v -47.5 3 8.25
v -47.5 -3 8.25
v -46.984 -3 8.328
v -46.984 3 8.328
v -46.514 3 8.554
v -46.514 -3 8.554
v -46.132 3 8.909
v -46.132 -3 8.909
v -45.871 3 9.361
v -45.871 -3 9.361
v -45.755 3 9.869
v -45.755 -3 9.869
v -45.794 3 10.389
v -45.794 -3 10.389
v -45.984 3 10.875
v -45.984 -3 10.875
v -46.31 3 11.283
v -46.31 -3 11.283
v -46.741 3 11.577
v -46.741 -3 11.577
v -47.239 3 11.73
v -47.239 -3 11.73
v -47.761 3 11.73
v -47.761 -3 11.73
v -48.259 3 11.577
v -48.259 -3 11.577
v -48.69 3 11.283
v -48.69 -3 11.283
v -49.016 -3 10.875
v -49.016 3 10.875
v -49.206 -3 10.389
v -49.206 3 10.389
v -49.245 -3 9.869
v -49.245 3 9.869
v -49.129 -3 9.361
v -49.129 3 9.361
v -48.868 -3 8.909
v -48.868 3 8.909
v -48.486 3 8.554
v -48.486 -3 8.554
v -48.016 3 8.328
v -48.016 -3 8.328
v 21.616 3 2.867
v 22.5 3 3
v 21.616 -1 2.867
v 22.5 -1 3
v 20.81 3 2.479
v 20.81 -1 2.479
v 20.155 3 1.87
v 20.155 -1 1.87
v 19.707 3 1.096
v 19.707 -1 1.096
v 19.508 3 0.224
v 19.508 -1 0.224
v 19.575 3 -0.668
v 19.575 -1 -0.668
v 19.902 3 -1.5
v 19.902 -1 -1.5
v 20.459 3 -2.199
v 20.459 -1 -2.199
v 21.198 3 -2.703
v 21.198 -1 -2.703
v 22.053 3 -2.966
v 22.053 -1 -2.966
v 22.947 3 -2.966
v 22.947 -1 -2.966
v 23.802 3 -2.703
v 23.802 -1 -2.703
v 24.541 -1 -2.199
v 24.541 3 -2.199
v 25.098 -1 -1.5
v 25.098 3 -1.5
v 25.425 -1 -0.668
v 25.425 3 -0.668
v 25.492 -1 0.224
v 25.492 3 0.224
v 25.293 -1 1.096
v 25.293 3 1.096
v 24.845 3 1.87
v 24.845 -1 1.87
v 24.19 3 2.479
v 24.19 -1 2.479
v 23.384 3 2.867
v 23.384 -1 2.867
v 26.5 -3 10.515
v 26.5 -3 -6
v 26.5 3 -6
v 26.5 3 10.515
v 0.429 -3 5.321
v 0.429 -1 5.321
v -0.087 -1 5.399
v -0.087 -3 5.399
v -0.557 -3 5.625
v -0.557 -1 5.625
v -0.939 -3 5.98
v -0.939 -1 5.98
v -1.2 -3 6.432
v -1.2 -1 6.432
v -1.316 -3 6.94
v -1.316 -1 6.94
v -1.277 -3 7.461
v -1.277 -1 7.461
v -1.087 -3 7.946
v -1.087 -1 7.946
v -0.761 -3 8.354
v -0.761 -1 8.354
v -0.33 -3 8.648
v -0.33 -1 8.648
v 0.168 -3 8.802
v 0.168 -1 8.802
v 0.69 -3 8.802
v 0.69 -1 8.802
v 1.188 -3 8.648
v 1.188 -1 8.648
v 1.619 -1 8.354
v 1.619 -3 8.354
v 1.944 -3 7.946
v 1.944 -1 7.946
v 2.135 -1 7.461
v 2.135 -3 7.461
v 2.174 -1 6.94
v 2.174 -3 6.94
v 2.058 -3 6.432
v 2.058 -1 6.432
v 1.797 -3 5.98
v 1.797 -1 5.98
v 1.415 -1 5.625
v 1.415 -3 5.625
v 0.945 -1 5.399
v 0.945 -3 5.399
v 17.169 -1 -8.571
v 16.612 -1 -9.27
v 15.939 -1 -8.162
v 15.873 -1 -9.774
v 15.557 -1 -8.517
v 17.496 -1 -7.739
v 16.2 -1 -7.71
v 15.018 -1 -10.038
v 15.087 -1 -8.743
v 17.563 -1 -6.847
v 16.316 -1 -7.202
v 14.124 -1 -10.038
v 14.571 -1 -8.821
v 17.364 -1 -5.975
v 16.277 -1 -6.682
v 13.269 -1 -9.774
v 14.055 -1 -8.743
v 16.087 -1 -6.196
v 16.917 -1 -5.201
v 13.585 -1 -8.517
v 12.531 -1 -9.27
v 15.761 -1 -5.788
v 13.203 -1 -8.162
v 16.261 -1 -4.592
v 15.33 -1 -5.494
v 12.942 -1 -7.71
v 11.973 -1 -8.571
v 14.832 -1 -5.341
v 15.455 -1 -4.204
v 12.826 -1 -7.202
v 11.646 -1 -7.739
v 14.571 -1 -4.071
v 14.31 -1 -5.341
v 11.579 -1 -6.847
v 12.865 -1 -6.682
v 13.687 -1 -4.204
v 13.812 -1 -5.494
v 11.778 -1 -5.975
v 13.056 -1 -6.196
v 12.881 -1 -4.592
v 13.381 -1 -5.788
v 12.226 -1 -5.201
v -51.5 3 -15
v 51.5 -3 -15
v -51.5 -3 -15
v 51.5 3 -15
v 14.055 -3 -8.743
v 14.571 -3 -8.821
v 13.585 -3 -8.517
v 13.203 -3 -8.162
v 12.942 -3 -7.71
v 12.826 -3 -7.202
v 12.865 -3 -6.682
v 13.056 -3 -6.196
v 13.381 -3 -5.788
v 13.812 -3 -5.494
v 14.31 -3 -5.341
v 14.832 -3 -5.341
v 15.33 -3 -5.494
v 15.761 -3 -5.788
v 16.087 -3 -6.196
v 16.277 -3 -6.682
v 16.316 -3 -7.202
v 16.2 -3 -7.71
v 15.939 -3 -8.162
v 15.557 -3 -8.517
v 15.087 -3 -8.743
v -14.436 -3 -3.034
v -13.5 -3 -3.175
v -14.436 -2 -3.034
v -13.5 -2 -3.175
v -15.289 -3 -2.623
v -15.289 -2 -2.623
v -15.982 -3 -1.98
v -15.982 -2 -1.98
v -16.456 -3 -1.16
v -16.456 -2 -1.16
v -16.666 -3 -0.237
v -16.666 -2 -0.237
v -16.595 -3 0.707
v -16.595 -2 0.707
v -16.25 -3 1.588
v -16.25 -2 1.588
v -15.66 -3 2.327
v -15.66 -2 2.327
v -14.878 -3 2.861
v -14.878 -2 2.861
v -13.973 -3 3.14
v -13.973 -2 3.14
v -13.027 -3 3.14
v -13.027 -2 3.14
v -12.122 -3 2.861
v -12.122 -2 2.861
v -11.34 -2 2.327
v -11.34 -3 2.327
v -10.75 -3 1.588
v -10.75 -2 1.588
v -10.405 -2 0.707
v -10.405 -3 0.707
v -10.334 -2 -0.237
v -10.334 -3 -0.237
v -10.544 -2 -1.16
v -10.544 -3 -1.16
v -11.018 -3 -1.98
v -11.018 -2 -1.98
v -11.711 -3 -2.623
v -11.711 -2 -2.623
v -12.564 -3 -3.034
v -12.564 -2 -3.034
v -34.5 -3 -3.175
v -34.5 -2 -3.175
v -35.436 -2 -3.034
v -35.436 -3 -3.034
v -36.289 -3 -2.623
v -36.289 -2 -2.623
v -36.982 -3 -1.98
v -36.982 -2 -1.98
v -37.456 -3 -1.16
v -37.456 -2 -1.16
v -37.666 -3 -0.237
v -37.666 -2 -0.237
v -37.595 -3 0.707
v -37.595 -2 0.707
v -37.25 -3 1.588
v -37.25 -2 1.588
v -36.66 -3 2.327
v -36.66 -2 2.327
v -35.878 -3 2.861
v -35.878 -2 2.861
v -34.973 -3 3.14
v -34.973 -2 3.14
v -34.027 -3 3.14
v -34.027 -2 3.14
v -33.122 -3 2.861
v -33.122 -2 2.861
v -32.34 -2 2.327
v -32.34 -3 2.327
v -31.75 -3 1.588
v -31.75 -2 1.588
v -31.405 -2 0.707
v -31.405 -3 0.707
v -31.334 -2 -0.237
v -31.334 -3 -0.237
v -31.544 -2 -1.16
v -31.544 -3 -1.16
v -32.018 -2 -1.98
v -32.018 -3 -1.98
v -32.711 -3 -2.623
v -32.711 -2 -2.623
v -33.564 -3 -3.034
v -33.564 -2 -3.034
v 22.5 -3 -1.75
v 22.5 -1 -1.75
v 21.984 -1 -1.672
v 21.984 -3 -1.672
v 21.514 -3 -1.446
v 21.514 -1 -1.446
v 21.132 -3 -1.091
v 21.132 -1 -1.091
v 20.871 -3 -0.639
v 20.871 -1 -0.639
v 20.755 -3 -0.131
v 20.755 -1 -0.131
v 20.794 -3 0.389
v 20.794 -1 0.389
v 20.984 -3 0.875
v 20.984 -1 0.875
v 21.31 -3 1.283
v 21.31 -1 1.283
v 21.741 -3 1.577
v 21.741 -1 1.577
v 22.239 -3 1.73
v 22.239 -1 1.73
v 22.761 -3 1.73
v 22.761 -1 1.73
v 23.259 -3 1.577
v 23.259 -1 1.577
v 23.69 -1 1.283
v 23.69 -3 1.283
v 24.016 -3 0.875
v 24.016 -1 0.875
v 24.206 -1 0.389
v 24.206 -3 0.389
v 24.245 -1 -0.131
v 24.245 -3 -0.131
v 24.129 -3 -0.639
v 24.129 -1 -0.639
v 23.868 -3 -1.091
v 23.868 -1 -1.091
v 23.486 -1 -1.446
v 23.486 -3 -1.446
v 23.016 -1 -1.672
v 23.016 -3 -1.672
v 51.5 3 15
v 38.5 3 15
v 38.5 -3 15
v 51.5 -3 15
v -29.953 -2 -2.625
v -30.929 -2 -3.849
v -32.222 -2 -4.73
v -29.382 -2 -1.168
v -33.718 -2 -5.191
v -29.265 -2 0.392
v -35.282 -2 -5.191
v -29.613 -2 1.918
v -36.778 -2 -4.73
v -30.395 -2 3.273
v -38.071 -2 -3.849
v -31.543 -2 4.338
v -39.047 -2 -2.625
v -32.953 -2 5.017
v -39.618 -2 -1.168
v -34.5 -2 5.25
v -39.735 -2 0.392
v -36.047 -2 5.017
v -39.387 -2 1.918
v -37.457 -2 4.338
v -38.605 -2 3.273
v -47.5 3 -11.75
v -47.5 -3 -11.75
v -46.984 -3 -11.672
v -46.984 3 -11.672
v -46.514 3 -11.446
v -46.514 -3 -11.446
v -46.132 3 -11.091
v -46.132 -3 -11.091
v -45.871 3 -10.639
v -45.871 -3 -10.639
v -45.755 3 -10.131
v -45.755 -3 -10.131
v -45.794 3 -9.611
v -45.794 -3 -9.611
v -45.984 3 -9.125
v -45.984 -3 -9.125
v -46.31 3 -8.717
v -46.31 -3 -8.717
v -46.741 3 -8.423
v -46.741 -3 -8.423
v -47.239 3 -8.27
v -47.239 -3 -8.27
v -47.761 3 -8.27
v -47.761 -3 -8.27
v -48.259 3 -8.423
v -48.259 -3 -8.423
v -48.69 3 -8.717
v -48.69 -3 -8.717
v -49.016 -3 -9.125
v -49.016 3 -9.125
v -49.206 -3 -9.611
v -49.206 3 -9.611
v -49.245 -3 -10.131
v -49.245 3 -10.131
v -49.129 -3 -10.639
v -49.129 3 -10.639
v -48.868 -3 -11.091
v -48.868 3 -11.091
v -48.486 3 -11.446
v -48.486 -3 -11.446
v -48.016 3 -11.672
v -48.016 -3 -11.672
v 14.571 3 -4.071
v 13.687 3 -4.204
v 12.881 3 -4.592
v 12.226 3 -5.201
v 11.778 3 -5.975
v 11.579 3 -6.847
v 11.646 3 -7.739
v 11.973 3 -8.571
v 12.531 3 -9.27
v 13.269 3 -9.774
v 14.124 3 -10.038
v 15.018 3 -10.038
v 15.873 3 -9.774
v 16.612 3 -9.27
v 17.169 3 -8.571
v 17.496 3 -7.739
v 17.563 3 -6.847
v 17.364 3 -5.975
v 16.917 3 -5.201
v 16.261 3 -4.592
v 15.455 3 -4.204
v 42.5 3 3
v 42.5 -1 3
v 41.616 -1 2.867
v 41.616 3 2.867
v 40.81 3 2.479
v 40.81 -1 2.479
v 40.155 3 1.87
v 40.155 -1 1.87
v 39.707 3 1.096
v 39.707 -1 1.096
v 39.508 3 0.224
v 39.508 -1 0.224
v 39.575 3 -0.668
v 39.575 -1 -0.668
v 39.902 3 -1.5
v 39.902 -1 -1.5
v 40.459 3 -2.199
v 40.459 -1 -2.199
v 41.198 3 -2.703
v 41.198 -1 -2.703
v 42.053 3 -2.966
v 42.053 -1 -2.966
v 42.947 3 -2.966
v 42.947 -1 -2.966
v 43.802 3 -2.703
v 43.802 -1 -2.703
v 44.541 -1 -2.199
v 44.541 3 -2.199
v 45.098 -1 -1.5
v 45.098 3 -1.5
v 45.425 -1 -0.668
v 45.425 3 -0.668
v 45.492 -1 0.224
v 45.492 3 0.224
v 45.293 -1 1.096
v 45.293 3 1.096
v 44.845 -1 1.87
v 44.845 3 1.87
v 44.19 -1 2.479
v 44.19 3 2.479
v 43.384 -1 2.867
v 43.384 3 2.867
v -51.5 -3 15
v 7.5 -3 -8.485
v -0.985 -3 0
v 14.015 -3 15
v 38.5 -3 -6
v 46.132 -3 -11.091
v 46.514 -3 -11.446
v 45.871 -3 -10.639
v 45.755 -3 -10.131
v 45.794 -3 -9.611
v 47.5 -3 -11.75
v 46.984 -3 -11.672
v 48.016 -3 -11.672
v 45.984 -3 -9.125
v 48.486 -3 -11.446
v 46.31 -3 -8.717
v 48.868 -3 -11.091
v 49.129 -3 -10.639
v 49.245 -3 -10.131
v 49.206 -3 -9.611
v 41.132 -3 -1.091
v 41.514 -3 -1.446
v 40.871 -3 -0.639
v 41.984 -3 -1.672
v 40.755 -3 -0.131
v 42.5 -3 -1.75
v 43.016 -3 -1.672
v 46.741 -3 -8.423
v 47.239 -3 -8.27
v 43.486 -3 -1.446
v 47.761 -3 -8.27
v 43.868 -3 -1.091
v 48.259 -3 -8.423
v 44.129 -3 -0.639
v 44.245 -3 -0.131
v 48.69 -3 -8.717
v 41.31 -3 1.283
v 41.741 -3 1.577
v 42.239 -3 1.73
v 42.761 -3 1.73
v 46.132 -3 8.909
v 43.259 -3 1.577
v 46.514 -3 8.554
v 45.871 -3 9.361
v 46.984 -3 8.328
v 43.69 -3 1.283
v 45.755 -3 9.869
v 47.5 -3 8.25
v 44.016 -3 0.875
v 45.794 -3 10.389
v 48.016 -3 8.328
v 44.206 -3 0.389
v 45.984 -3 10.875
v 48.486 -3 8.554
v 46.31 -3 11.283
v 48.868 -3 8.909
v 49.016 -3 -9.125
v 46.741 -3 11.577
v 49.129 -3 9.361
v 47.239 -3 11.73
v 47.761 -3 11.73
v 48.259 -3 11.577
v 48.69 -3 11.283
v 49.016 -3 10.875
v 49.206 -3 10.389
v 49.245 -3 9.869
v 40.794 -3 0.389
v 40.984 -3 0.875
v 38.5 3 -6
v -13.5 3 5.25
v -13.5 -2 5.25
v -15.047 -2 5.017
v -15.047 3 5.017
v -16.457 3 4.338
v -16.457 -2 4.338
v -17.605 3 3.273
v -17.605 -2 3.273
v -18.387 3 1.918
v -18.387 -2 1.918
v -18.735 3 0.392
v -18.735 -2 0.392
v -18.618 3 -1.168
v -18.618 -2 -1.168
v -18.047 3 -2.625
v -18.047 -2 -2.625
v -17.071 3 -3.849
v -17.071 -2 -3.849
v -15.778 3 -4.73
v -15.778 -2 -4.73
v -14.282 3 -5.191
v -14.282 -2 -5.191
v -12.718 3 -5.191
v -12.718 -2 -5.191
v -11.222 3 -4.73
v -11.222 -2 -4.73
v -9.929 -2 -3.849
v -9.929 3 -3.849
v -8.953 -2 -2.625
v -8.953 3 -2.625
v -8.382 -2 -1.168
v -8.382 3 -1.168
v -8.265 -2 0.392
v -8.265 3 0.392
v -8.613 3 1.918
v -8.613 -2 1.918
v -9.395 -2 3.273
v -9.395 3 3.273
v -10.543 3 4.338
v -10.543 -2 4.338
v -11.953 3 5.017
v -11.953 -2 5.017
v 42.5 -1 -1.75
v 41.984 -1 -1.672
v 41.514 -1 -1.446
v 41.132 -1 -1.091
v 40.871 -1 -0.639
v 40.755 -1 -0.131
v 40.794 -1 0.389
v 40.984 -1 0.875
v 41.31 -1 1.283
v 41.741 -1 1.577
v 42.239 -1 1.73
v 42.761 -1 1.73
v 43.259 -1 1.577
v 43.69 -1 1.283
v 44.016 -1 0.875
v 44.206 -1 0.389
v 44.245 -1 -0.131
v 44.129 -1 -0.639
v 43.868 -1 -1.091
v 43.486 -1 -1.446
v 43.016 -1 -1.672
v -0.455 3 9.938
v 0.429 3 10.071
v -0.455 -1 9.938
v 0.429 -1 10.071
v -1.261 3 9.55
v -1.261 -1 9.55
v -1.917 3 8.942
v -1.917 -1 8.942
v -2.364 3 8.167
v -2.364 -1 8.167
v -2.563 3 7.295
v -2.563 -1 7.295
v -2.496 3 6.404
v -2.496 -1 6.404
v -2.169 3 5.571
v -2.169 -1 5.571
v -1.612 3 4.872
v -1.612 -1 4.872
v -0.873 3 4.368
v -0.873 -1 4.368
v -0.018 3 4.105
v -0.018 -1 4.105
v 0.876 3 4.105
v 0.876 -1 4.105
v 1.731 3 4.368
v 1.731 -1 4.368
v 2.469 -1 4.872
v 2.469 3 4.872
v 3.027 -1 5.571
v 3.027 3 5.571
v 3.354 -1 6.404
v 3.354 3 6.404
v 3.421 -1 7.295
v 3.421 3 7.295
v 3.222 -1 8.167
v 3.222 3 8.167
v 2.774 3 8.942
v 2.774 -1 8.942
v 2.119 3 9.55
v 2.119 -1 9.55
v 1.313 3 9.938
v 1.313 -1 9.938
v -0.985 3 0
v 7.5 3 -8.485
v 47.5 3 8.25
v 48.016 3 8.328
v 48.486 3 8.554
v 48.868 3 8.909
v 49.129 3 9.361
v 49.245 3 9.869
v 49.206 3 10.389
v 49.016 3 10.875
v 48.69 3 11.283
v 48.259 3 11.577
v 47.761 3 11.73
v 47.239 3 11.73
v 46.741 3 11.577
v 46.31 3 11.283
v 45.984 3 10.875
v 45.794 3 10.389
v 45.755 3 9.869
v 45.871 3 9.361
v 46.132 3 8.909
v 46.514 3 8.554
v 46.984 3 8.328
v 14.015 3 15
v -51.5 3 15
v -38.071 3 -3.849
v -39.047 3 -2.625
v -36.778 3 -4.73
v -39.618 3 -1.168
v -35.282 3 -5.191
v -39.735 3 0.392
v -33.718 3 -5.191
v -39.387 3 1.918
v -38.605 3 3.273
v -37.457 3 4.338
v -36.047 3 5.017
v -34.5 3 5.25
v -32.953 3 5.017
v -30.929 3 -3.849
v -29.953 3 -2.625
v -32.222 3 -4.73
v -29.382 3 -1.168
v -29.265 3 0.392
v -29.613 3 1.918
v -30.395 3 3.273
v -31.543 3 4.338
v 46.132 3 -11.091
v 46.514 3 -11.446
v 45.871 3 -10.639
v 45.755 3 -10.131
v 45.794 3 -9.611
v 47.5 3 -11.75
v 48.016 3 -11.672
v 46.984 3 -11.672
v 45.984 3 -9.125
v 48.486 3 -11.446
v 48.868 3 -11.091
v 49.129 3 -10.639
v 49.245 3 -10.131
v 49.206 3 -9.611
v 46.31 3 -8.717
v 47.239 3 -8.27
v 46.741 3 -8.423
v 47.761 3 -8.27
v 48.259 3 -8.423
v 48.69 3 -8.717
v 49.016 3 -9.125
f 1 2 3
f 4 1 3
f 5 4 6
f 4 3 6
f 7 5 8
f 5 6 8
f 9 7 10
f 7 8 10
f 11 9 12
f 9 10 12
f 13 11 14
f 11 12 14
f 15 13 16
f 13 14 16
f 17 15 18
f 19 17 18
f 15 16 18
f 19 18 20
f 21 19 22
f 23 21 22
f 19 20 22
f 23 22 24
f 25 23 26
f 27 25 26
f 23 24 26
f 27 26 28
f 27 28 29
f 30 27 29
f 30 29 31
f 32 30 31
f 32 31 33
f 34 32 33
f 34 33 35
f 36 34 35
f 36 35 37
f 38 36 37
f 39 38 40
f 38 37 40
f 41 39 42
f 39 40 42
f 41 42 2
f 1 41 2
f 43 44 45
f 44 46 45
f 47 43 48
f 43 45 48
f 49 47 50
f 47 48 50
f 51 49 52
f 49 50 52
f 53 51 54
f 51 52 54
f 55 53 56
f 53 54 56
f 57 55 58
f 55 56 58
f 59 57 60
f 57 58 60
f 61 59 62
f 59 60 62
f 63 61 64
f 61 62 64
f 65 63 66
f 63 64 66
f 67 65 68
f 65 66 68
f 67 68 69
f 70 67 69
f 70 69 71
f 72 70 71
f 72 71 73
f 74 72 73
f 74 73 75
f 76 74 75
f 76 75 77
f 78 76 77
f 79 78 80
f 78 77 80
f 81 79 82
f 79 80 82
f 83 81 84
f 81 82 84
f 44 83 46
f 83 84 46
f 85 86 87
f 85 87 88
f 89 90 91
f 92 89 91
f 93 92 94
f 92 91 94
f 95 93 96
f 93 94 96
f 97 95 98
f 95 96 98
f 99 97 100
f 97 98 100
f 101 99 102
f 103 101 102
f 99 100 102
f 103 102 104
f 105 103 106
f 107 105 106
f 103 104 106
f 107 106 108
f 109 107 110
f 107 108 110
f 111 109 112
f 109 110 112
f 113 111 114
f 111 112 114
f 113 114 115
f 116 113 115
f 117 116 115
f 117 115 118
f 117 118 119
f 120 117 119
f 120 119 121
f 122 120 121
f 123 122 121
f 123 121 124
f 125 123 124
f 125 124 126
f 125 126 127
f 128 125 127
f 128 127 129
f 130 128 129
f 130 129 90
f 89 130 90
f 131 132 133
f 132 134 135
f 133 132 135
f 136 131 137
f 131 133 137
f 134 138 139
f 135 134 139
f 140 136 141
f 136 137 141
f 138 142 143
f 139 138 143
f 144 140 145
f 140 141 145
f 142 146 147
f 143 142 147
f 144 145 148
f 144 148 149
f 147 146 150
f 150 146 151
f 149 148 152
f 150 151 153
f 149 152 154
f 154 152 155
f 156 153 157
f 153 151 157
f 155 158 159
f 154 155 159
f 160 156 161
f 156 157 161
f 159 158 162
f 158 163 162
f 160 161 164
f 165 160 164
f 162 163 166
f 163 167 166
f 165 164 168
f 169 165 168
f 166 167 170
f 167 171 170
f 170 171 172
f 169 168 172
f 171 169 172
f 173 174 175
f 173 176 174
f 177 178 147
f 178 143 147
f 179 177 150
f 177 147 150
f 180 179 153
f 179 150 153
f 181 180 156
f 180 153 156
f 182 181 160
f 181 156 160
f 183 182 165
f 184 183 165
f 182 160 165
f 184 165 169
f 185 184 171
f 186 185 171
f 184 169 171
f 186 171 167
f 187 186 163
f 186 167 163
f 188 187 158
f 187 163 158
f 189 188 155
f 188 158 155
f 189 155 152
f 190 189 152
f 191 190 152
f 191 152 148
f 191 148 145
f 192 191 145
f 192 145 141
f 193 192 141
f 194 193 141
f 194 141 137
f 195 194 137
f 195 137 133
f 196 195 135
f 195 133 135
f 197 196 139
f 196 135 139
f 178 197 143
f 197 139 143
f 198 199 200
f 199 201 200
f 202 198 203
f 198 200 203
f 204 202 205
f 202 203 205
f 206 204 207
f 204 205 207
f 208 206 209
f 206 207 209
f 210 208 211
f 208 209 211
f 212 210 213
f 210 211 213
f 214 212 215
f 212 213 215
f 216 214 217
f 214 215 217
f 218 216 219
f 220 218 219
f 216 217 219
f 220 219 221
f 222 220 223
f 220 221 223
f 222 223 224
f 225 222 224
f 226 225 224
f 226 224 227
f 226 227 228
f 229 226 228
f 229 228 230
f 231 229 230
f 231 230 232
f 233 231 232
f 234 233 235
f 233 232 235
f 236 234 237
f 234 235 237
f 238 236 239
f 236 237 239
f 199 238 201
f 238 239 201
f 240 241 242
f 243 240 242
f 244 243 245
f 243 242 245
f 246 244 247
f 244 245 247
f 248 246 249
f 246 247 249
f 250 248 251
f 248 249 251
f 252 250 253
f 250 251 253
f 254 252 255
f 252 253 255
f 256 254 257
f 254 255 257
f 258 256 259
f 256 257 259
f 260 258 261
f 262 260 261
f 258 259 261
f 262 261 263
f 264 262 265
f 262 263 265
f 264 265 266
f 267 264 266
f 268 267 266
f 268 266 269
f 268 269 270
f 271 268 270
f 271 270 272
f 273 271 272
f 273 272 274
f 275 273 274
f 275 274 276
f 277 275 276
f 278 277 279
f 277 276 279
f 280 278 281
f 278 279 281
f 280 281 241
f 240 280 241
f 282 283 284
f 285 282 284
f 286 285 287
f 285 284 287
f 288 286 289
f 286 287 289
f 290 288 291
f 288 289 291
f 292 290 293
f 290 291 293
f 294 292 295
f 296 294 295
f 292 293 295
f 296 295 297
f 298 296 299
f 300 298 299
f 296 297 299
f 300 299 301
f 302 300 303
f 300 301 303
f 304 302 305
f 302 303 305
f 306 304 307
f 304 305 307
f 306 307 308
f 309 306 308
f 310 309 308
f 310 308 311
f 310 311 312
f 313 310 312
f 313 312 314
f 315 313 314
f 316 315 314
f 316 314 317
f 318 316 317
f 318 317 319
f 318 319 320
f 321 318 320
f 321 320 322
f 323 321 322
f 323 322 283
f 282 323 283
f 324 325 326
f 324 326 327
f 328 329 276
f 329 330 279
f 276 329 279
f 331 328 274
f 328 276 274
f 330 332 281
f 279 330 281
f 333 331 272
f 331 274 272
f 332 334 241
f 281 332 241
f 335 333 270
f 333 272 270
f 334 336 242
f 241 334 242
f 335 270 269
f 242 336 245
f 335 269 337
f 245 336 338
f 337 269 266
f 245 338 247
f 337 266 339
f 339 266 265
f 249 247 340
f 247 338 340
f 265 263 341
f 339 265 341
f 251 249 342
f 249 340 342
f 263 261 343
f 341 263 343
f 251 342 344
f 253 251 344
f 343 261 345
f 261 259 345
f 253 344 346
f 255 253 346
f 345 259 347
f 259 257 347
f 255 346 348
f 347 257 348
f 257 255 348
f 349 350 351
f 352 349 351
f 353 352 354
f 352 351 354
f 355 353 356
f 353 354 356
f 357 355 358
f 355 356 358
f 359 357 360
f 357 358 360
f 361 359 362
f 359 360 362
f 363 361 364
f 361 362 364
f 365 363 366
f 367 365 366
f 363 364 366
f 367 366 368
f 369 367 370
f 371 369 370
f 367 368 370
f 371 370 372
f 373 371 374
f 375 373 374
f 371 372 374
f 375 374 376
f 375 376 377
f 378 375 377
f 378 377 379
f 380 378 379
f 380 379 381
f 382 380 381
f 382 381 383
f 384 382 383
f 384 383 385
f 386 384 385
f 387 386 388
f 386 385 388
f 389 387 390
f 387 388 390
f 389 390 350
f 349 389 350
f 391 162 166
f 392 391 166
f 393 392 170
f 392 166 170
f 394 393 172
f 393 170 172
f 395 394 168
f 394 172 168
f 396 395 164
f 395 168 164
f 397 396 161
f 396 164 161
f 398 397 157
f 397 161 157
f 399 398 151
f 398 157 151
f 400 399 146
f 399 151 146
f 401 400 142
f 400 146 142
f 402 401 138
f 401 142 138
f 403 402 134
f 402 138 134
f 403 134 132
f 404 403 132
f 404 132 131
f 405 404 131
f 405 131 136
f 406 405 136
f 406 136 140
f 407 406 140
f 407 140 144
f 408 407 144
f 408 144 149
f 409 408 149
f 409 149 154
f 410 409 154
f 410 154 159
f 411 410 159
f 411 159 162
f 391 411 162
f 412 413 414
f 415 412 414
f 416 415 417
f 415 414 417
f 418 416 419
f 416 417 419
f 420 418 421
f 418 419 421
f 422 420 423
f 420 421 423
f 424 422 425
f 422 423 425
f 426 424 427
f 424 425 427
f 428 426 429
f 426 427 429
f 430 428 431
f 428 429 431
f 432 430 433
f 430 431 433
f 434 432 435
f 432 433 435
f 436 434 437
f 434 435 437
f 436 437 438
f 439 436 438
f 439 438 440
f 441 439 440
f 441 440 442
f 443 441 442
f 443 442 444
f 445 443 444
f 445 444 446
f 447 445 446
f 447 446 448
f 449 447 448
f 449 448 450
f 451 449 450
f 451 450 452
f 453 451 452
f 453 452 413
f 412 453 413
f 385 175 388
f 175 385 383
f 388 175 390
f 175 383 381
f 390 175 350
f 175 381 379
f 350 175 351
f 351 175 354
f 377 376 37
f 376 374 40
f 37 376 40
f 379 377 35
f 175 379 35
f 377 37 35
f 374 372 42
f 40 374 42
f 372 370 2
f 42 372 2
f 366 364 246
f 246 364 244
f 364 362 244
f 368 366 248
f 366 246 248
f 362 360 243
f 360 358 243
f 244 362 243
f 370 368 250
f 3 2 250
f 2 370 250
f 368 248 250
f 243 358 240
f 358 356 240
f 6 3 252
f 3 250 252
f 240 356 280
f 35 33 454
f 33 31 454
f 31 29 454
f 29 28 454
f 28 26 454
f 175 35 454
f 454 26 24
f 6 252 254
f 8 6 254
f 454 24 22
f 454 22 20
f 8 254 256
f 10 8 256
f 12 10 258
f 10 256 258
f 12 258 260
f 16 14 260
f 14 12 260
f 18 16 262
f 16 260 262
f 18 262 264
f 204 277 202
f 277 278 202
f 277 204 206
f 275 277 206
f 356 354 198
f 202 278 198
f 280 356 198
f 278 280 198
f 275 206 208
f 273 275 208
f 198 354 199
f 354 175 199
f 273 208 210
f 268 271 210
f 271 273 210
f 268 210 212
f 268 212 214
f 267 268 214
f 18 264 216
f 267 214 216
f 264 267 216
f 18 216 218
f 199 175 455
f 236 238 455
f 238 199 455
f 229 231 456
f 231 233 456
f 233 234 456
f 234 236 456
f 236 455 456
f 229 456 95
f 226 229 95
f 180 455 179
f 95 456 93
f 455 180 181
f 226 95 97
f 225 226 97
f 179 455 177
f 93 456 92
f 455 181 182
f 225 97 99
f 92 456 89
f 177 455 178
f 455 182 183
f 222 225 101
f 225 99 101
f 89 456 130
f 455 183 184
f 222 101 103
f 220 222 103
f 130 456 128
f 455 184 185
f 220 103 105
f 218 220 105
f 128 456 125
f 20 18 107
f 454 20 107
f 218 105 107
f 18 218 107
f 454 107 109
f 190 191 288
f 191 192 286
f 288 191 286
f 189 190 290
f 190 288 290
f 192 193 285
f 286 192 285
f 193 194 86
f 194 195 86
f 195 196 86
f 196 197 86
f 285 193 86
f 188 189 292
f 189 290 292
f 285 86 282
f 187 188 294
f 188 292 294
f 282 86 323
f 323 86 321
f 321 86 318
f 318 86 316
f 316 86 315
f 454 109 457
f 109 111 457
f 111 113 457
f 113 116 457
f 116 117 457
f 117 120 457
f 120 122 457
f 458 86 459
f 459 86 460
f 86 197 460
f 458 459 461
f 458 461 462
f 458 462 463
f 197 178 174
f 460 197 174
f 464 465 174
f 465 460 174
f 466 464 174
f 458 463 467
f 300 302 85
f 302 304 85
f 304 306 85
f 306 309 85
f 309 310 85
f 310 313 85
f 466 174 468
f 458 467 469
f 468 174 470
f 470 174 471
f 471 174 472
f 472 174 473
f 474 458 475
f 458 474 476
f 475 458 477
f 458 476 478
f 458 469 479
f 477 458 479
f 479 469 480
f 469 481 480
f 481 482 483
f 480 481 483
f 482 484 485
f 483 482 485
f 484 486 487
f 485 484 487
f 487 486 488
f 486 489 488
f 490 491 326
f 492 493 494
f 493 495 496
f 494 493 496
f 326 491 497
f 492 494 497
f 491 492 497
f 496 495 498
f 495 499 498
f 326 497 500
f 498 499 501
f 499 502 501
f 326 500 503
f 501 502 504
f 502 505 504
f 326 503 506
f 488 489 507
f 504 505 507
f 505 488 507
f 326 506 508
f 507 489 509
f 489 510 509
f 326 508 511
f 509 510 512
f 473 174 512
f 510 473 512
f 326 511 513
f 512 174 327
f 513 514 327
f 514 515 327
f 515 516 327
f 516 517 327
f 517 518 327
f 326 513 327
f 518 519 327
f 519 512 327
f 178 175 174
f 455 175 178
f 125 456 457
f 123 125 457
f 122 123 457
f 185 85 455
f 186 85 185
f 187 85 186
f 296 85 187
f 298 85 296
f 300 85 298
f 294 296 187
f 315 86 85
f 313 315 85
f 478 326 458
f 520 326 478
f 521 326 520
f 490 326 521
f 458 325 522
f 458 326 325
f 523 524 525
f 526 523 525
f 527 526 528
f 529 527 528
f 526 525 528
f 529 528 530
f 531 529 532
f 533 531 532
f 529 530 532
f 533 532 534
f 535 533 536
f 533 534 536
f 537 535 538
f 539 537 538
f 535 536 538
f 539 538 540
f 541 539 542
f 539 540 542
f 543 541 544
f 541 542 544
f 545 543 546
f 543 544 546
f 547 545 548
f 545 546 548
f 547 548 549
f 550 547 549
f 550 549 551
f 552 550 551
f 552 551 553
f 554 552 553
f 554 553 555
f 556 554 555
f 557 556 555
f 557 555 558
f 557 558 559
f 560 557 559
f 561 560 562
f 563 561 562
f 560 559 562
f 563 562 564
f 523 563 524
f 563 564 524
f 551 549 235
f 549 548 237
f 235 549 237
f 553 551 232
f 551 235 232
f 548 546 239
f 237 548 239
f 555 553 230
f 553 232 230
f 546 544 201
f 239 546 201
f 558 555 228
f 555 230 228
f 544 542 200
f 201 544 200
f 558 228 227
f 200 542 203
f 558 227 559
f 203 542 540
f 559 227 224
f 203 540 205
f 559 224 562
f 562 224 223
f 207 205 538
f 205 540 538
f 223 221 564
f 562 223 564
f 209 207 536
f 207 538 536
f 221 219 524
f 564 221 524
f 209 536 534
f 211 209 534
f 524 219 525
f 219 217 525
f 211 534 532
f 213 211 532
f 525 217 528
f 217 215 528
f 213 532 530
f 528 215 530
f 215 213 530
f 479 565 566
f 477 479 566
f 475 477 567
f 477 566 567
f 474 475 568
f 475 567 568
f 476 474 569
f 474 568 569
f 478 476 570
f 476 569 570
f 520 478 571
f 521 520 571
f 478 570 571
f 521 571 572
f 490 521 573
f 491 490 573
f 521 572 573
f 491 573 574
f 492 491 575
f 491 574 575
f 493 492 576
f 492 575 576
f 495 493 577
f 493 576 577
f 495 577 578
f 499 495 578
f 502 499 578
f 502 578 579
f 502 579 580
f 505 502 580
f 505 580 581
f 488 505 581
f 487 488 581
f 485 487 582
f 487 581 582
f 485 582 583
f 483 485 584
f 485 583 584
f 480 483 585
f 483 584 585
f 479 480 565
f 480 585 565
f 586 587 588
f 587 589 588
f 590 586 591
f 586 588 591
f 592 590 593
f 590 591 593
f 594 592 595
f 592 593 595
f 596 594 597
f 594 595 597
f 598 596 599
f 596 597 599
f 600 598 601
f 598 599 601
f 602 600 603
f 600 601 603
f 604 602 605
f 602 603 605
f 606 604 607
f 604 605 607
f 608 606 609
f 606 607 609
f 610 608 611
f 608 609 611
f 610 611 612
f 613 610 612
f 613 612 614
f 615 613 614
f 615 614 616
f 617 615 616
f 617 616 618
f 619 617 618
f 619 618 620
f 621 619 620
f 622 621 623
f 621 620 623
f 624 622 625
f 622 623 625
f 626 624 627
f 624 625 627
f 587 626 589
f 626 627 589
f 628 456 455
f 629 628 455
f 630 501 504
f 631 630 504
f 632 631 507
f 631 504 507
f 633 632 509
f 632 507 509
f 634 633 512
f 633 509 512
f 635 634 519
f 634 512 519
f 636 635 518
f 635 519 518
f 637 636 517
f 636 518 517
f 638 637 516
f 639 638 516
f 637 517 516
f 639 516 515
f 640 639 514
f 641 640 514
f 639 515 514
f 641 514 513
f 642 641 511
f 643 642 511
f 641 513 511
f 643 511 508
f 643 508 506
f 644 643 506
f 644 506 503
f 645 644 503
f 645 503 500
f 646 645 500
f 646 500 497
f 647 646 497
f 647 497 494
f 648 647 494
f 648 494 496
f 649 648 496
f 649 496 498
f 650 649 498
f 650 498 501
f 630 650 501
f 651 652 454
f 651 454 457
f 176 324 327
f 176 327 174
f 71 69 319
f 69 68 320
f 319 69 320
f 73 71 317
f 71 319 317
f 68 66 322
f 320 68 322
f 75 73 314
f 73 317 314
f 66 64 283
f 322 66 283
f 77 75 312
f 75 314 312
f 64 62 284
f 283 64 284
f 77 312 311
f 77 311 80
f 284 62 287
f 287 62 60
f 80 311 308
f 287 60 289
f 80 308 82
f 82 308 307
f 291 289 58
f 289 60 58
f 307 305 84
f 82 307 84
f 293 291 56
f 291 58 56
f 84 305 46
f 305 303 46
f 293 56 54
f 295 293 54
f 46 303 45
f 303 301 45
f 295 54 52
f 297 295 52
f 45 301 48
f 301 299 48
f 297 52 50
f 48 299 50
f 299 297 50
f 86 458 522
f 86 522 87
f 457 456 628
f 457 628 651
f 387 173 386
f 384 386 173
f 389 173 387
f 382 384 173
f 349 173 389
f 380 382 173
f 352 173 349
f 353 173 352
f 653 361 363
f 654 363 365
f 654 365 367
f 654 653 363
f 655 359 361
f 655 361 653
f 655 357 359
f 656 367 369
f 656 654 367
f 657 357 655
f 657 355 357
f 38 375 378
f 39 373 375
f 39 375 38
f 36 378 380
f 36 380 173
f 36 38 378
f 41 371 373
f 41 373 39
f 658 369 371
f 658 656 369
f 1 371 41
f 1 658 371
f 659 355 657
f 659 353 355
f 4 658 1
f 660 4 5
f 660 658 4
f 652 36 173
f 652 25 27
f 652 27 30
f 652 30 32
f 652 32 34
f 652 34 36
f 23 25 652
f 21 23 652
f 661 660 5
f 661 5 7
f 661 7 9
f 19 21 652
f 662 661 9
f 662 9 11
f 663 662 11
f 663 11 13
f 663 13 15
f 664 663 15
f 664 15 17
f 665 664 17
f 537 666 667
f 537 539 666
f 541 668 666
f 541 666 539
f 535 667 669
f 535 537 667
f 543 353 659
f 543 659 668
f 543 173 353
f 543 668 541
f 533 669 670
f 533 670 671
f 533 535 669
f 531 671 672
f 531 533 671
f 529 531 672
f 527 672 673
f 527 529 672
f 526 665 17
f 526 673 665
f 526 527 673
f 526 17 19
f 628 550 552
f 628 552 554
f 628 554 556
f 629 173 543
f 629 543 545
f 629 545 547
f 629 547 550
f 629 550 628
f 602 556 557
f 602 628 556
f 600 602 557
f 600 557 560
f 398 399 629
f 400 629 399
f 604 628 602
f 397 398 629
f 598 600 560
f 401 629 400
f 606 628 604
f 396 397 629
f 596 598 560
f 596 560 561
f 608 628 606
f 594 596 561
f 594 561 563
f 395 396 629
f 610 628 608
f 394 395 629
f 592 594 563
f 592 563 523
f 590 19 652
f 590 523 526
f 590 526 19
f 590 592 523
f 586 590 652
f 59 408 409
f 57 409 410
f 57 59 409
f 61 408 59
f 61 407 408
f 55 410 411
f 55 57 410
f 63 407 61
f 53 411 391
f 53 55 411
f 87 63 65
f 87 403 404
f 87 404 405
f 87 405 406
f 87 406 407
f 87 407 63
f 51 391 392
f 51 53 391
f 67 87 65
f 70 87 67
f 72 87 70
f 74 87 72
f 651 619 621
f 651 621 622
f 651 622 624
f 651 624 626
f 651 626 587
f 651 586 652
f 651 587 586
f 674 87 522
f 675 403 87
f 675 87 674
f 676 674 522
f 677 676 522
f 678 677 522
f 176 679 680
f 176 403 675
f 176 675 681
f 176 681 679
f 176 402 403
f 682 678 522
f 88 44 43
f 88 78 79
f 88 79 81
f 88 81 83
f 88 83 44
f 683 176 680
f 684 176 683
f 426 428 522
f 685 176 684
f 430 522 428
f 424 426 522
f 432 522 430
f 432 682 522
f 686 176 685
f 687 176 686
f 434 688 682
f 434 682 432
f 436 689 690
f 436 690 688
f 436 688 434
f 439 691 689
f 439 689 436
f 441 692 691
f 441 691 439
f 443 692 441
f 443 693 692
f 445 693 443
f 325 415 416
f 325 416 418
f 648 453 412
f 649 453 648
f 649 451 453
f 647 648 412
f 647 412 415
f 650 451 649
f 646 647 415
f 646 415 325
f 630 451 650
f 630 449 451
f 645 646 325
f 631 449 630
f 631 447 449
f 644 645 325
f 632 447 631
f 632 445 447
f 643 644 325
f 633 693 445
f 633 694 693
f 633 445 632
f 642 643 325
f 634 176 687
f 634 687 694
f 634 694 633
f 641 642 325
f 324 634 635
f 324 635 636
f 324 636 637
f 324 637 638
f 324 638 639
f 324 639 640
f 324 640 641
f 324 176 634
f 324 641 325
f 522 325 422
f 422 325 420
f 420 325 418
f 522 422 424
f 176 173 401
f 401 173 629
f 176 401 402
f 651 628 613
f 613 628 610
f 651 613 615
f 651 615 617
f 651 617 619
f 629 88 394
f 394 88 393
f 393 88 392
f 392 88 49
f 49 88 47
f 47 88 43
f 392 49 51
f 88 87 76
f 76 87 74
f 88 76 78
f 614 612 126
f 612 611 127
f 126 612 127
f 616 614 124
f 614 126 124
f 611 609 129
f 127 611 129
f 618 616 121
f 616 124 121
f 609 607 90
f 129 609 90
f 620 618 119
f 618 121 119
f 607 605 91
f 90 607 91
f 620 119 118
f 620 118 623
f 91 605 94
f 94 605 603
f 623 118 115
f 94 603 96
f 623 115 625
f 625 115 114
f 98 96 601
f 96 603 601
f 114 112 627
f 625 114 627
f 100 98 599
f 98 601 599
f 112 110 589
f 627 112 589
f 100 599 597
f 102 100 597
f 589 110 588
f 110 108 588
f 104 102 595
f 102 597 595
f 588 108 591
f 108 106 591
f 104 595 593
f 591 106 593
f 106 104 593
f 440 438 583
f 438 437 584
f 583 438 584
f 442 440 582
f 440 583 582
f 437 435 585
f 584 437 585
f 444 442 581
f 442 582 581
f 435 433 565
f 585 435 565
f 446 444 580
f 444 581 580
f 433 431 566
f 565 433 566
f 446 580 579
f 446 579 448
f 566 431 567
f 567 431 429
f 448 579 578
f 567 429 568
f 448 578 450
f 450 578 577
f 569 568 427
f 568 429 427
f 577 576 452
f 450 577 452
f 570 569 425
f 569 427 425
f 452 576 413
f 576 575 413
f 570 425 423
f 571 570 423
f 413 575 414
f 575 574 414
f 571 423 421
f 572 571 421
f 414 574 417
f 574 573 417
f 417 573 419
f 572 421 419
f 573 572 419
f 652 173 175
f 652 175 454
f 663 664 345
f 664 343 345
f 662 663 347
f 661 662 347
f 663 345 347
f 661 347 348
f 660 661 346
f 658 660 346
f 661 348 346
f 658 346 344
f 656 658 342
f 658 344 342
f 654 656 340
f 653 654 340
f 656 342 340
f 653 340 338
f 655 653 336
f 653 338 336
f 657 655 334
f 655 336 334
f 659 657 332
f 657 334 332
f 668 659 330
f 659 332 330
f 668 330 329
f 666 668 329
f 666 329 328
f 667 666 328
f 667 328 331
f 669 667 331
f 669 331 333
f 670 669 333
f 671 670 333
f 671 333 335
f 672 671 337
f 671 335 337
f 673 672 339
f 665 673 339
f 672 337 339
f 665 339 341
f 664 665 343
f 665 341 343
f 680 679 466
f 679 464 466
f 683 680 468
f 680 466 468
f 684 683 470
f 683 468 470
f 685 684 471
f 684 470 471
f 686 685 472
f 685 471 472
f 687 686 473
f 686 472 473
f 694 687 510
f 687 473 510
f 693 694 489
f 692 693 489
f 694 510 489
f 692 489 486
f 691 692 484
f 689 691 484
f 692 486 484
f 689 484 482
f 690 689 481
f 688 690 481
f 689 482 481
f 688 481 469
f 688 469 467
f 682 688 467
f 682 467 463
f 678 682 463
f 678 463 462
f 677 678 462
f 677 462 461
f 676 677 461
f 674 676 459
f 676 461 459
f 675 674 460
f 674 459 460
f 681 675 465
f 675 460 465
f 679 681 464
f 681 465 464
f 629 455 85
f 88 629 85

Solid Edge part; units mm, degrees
sketch "Sketch1" plane through (0, 0, 0) normal (0, -1, 0) x (1, 0, 0)
  line L0 (-51.5, 15) -> (51.5, 15)
  line L1 (51.5, 15) -> (51.5, -15)
  line L2 (51.5, -15) -> (-51.5, -15)
  line L3 (-51.5, -15) -> (-51.5, 15)
  dimension "D1" = 30
  dimension "D2" = 103
extrude "Protrusion1" add sketch "Sketch1" along normal mid plane 6
hole "Bohrung_1" at (47.5, -3, 10) direction (0, 1, 0) diameter 3.5 end through all
hole "Hole1" at (47.5, -3, -10) direction (0, 1, 0) diameter 3.5 end through all
hole "Hole2" at (-47.5, -3, -10) direction (0, 1, 0) diameter 3.5 end through all
hole "Hole3" at (-47.5, -3, 10) direction (0, 1, 0) diameter 3.5 end through all
sketch "Sketch2" plane through (0, -3, 0) normal (0, -1, 0) x (1, 0, 0)
  line L0 (26.5, 15) -> (38.5, 15)
  line L1 (38.5, 15) -> (38.5, -6)
  line L2 (38.5, -6) -> (26.5, -6)
  line L3 (26.5, -6) -> (26.5, 15)
  dimension "D1" = 9
  dimension "D2" = 9
  dimension "D3" = 12
  dimension "D4" = 6
extrude "Ausschnitt_1" cut sketch "Sketch2" against normal blind 168.275
hole "Bohrung_5" at (22.5, -3, 0) direction (0, 1, 0) diameter 3.5 depth 2
hole "Hole4" at (42.5, -3, 0) direction (0, 1, 0) diameter 3.5 depth 2
hole "Bohrung_9" at (-34.5, -3, 0) direction (0, 1, 0) diameter 6.35 depth 1
hole "Hole5" at (-13.5, -3, 0) direction (0, 1, 0) diameter 6.35 depth 1
sketch "Sketch3" plane through (0, -3, 0) normal (0, -1, 0) x (1, 0, 0)
  line L0 (-0.9853, 0) -> (7.5, -8.4853)
  line L1 (7.5, -8.4853) -> (30.9853, 15)
  line L2 (14.0147, 15) -> (30.9853, 15)
  line L3 (-0.9853, 0) -> (14.0147, 15)
  dimension "D1" = 0.9853
extrude "Ausschnitt_5" cut sketch "Sketch3" against normal blind 285.75
hole "Bohrung_11" at (14.5711, -3, -7.0711) direction (0, 1, 0) diameter 3.5 depth 2
hole "Hole6" at (0.4289, -3, 7.0711) direction (0, 1, 0) diameter 3.5 depth 2
hole "Bohrung_13" at (-34.5, 3, 0) direction (0, -1, 0) diameter 10.5 depth 5
hole "Hole7" at (-13.5, 3, 0) direction (0, -1, 0) diameter 10.5 depth 5
hole "Bohrung_15" at (14.5711, 3, -7.0711) direction (0, -1, 0) diameter 6 depth 4
hole "Hole8" at (0.4289, 3, 7.0711) direction (0, -1, 0) diameter 6 depth 4
hole "Hole9" at (22.5, 3, 0) direction (0, -1, 0) diameter 6 depth 4
hole "Hole10" at (42.5, 3, 0) direction (0, -1, 0) diameter 6 depth 4
